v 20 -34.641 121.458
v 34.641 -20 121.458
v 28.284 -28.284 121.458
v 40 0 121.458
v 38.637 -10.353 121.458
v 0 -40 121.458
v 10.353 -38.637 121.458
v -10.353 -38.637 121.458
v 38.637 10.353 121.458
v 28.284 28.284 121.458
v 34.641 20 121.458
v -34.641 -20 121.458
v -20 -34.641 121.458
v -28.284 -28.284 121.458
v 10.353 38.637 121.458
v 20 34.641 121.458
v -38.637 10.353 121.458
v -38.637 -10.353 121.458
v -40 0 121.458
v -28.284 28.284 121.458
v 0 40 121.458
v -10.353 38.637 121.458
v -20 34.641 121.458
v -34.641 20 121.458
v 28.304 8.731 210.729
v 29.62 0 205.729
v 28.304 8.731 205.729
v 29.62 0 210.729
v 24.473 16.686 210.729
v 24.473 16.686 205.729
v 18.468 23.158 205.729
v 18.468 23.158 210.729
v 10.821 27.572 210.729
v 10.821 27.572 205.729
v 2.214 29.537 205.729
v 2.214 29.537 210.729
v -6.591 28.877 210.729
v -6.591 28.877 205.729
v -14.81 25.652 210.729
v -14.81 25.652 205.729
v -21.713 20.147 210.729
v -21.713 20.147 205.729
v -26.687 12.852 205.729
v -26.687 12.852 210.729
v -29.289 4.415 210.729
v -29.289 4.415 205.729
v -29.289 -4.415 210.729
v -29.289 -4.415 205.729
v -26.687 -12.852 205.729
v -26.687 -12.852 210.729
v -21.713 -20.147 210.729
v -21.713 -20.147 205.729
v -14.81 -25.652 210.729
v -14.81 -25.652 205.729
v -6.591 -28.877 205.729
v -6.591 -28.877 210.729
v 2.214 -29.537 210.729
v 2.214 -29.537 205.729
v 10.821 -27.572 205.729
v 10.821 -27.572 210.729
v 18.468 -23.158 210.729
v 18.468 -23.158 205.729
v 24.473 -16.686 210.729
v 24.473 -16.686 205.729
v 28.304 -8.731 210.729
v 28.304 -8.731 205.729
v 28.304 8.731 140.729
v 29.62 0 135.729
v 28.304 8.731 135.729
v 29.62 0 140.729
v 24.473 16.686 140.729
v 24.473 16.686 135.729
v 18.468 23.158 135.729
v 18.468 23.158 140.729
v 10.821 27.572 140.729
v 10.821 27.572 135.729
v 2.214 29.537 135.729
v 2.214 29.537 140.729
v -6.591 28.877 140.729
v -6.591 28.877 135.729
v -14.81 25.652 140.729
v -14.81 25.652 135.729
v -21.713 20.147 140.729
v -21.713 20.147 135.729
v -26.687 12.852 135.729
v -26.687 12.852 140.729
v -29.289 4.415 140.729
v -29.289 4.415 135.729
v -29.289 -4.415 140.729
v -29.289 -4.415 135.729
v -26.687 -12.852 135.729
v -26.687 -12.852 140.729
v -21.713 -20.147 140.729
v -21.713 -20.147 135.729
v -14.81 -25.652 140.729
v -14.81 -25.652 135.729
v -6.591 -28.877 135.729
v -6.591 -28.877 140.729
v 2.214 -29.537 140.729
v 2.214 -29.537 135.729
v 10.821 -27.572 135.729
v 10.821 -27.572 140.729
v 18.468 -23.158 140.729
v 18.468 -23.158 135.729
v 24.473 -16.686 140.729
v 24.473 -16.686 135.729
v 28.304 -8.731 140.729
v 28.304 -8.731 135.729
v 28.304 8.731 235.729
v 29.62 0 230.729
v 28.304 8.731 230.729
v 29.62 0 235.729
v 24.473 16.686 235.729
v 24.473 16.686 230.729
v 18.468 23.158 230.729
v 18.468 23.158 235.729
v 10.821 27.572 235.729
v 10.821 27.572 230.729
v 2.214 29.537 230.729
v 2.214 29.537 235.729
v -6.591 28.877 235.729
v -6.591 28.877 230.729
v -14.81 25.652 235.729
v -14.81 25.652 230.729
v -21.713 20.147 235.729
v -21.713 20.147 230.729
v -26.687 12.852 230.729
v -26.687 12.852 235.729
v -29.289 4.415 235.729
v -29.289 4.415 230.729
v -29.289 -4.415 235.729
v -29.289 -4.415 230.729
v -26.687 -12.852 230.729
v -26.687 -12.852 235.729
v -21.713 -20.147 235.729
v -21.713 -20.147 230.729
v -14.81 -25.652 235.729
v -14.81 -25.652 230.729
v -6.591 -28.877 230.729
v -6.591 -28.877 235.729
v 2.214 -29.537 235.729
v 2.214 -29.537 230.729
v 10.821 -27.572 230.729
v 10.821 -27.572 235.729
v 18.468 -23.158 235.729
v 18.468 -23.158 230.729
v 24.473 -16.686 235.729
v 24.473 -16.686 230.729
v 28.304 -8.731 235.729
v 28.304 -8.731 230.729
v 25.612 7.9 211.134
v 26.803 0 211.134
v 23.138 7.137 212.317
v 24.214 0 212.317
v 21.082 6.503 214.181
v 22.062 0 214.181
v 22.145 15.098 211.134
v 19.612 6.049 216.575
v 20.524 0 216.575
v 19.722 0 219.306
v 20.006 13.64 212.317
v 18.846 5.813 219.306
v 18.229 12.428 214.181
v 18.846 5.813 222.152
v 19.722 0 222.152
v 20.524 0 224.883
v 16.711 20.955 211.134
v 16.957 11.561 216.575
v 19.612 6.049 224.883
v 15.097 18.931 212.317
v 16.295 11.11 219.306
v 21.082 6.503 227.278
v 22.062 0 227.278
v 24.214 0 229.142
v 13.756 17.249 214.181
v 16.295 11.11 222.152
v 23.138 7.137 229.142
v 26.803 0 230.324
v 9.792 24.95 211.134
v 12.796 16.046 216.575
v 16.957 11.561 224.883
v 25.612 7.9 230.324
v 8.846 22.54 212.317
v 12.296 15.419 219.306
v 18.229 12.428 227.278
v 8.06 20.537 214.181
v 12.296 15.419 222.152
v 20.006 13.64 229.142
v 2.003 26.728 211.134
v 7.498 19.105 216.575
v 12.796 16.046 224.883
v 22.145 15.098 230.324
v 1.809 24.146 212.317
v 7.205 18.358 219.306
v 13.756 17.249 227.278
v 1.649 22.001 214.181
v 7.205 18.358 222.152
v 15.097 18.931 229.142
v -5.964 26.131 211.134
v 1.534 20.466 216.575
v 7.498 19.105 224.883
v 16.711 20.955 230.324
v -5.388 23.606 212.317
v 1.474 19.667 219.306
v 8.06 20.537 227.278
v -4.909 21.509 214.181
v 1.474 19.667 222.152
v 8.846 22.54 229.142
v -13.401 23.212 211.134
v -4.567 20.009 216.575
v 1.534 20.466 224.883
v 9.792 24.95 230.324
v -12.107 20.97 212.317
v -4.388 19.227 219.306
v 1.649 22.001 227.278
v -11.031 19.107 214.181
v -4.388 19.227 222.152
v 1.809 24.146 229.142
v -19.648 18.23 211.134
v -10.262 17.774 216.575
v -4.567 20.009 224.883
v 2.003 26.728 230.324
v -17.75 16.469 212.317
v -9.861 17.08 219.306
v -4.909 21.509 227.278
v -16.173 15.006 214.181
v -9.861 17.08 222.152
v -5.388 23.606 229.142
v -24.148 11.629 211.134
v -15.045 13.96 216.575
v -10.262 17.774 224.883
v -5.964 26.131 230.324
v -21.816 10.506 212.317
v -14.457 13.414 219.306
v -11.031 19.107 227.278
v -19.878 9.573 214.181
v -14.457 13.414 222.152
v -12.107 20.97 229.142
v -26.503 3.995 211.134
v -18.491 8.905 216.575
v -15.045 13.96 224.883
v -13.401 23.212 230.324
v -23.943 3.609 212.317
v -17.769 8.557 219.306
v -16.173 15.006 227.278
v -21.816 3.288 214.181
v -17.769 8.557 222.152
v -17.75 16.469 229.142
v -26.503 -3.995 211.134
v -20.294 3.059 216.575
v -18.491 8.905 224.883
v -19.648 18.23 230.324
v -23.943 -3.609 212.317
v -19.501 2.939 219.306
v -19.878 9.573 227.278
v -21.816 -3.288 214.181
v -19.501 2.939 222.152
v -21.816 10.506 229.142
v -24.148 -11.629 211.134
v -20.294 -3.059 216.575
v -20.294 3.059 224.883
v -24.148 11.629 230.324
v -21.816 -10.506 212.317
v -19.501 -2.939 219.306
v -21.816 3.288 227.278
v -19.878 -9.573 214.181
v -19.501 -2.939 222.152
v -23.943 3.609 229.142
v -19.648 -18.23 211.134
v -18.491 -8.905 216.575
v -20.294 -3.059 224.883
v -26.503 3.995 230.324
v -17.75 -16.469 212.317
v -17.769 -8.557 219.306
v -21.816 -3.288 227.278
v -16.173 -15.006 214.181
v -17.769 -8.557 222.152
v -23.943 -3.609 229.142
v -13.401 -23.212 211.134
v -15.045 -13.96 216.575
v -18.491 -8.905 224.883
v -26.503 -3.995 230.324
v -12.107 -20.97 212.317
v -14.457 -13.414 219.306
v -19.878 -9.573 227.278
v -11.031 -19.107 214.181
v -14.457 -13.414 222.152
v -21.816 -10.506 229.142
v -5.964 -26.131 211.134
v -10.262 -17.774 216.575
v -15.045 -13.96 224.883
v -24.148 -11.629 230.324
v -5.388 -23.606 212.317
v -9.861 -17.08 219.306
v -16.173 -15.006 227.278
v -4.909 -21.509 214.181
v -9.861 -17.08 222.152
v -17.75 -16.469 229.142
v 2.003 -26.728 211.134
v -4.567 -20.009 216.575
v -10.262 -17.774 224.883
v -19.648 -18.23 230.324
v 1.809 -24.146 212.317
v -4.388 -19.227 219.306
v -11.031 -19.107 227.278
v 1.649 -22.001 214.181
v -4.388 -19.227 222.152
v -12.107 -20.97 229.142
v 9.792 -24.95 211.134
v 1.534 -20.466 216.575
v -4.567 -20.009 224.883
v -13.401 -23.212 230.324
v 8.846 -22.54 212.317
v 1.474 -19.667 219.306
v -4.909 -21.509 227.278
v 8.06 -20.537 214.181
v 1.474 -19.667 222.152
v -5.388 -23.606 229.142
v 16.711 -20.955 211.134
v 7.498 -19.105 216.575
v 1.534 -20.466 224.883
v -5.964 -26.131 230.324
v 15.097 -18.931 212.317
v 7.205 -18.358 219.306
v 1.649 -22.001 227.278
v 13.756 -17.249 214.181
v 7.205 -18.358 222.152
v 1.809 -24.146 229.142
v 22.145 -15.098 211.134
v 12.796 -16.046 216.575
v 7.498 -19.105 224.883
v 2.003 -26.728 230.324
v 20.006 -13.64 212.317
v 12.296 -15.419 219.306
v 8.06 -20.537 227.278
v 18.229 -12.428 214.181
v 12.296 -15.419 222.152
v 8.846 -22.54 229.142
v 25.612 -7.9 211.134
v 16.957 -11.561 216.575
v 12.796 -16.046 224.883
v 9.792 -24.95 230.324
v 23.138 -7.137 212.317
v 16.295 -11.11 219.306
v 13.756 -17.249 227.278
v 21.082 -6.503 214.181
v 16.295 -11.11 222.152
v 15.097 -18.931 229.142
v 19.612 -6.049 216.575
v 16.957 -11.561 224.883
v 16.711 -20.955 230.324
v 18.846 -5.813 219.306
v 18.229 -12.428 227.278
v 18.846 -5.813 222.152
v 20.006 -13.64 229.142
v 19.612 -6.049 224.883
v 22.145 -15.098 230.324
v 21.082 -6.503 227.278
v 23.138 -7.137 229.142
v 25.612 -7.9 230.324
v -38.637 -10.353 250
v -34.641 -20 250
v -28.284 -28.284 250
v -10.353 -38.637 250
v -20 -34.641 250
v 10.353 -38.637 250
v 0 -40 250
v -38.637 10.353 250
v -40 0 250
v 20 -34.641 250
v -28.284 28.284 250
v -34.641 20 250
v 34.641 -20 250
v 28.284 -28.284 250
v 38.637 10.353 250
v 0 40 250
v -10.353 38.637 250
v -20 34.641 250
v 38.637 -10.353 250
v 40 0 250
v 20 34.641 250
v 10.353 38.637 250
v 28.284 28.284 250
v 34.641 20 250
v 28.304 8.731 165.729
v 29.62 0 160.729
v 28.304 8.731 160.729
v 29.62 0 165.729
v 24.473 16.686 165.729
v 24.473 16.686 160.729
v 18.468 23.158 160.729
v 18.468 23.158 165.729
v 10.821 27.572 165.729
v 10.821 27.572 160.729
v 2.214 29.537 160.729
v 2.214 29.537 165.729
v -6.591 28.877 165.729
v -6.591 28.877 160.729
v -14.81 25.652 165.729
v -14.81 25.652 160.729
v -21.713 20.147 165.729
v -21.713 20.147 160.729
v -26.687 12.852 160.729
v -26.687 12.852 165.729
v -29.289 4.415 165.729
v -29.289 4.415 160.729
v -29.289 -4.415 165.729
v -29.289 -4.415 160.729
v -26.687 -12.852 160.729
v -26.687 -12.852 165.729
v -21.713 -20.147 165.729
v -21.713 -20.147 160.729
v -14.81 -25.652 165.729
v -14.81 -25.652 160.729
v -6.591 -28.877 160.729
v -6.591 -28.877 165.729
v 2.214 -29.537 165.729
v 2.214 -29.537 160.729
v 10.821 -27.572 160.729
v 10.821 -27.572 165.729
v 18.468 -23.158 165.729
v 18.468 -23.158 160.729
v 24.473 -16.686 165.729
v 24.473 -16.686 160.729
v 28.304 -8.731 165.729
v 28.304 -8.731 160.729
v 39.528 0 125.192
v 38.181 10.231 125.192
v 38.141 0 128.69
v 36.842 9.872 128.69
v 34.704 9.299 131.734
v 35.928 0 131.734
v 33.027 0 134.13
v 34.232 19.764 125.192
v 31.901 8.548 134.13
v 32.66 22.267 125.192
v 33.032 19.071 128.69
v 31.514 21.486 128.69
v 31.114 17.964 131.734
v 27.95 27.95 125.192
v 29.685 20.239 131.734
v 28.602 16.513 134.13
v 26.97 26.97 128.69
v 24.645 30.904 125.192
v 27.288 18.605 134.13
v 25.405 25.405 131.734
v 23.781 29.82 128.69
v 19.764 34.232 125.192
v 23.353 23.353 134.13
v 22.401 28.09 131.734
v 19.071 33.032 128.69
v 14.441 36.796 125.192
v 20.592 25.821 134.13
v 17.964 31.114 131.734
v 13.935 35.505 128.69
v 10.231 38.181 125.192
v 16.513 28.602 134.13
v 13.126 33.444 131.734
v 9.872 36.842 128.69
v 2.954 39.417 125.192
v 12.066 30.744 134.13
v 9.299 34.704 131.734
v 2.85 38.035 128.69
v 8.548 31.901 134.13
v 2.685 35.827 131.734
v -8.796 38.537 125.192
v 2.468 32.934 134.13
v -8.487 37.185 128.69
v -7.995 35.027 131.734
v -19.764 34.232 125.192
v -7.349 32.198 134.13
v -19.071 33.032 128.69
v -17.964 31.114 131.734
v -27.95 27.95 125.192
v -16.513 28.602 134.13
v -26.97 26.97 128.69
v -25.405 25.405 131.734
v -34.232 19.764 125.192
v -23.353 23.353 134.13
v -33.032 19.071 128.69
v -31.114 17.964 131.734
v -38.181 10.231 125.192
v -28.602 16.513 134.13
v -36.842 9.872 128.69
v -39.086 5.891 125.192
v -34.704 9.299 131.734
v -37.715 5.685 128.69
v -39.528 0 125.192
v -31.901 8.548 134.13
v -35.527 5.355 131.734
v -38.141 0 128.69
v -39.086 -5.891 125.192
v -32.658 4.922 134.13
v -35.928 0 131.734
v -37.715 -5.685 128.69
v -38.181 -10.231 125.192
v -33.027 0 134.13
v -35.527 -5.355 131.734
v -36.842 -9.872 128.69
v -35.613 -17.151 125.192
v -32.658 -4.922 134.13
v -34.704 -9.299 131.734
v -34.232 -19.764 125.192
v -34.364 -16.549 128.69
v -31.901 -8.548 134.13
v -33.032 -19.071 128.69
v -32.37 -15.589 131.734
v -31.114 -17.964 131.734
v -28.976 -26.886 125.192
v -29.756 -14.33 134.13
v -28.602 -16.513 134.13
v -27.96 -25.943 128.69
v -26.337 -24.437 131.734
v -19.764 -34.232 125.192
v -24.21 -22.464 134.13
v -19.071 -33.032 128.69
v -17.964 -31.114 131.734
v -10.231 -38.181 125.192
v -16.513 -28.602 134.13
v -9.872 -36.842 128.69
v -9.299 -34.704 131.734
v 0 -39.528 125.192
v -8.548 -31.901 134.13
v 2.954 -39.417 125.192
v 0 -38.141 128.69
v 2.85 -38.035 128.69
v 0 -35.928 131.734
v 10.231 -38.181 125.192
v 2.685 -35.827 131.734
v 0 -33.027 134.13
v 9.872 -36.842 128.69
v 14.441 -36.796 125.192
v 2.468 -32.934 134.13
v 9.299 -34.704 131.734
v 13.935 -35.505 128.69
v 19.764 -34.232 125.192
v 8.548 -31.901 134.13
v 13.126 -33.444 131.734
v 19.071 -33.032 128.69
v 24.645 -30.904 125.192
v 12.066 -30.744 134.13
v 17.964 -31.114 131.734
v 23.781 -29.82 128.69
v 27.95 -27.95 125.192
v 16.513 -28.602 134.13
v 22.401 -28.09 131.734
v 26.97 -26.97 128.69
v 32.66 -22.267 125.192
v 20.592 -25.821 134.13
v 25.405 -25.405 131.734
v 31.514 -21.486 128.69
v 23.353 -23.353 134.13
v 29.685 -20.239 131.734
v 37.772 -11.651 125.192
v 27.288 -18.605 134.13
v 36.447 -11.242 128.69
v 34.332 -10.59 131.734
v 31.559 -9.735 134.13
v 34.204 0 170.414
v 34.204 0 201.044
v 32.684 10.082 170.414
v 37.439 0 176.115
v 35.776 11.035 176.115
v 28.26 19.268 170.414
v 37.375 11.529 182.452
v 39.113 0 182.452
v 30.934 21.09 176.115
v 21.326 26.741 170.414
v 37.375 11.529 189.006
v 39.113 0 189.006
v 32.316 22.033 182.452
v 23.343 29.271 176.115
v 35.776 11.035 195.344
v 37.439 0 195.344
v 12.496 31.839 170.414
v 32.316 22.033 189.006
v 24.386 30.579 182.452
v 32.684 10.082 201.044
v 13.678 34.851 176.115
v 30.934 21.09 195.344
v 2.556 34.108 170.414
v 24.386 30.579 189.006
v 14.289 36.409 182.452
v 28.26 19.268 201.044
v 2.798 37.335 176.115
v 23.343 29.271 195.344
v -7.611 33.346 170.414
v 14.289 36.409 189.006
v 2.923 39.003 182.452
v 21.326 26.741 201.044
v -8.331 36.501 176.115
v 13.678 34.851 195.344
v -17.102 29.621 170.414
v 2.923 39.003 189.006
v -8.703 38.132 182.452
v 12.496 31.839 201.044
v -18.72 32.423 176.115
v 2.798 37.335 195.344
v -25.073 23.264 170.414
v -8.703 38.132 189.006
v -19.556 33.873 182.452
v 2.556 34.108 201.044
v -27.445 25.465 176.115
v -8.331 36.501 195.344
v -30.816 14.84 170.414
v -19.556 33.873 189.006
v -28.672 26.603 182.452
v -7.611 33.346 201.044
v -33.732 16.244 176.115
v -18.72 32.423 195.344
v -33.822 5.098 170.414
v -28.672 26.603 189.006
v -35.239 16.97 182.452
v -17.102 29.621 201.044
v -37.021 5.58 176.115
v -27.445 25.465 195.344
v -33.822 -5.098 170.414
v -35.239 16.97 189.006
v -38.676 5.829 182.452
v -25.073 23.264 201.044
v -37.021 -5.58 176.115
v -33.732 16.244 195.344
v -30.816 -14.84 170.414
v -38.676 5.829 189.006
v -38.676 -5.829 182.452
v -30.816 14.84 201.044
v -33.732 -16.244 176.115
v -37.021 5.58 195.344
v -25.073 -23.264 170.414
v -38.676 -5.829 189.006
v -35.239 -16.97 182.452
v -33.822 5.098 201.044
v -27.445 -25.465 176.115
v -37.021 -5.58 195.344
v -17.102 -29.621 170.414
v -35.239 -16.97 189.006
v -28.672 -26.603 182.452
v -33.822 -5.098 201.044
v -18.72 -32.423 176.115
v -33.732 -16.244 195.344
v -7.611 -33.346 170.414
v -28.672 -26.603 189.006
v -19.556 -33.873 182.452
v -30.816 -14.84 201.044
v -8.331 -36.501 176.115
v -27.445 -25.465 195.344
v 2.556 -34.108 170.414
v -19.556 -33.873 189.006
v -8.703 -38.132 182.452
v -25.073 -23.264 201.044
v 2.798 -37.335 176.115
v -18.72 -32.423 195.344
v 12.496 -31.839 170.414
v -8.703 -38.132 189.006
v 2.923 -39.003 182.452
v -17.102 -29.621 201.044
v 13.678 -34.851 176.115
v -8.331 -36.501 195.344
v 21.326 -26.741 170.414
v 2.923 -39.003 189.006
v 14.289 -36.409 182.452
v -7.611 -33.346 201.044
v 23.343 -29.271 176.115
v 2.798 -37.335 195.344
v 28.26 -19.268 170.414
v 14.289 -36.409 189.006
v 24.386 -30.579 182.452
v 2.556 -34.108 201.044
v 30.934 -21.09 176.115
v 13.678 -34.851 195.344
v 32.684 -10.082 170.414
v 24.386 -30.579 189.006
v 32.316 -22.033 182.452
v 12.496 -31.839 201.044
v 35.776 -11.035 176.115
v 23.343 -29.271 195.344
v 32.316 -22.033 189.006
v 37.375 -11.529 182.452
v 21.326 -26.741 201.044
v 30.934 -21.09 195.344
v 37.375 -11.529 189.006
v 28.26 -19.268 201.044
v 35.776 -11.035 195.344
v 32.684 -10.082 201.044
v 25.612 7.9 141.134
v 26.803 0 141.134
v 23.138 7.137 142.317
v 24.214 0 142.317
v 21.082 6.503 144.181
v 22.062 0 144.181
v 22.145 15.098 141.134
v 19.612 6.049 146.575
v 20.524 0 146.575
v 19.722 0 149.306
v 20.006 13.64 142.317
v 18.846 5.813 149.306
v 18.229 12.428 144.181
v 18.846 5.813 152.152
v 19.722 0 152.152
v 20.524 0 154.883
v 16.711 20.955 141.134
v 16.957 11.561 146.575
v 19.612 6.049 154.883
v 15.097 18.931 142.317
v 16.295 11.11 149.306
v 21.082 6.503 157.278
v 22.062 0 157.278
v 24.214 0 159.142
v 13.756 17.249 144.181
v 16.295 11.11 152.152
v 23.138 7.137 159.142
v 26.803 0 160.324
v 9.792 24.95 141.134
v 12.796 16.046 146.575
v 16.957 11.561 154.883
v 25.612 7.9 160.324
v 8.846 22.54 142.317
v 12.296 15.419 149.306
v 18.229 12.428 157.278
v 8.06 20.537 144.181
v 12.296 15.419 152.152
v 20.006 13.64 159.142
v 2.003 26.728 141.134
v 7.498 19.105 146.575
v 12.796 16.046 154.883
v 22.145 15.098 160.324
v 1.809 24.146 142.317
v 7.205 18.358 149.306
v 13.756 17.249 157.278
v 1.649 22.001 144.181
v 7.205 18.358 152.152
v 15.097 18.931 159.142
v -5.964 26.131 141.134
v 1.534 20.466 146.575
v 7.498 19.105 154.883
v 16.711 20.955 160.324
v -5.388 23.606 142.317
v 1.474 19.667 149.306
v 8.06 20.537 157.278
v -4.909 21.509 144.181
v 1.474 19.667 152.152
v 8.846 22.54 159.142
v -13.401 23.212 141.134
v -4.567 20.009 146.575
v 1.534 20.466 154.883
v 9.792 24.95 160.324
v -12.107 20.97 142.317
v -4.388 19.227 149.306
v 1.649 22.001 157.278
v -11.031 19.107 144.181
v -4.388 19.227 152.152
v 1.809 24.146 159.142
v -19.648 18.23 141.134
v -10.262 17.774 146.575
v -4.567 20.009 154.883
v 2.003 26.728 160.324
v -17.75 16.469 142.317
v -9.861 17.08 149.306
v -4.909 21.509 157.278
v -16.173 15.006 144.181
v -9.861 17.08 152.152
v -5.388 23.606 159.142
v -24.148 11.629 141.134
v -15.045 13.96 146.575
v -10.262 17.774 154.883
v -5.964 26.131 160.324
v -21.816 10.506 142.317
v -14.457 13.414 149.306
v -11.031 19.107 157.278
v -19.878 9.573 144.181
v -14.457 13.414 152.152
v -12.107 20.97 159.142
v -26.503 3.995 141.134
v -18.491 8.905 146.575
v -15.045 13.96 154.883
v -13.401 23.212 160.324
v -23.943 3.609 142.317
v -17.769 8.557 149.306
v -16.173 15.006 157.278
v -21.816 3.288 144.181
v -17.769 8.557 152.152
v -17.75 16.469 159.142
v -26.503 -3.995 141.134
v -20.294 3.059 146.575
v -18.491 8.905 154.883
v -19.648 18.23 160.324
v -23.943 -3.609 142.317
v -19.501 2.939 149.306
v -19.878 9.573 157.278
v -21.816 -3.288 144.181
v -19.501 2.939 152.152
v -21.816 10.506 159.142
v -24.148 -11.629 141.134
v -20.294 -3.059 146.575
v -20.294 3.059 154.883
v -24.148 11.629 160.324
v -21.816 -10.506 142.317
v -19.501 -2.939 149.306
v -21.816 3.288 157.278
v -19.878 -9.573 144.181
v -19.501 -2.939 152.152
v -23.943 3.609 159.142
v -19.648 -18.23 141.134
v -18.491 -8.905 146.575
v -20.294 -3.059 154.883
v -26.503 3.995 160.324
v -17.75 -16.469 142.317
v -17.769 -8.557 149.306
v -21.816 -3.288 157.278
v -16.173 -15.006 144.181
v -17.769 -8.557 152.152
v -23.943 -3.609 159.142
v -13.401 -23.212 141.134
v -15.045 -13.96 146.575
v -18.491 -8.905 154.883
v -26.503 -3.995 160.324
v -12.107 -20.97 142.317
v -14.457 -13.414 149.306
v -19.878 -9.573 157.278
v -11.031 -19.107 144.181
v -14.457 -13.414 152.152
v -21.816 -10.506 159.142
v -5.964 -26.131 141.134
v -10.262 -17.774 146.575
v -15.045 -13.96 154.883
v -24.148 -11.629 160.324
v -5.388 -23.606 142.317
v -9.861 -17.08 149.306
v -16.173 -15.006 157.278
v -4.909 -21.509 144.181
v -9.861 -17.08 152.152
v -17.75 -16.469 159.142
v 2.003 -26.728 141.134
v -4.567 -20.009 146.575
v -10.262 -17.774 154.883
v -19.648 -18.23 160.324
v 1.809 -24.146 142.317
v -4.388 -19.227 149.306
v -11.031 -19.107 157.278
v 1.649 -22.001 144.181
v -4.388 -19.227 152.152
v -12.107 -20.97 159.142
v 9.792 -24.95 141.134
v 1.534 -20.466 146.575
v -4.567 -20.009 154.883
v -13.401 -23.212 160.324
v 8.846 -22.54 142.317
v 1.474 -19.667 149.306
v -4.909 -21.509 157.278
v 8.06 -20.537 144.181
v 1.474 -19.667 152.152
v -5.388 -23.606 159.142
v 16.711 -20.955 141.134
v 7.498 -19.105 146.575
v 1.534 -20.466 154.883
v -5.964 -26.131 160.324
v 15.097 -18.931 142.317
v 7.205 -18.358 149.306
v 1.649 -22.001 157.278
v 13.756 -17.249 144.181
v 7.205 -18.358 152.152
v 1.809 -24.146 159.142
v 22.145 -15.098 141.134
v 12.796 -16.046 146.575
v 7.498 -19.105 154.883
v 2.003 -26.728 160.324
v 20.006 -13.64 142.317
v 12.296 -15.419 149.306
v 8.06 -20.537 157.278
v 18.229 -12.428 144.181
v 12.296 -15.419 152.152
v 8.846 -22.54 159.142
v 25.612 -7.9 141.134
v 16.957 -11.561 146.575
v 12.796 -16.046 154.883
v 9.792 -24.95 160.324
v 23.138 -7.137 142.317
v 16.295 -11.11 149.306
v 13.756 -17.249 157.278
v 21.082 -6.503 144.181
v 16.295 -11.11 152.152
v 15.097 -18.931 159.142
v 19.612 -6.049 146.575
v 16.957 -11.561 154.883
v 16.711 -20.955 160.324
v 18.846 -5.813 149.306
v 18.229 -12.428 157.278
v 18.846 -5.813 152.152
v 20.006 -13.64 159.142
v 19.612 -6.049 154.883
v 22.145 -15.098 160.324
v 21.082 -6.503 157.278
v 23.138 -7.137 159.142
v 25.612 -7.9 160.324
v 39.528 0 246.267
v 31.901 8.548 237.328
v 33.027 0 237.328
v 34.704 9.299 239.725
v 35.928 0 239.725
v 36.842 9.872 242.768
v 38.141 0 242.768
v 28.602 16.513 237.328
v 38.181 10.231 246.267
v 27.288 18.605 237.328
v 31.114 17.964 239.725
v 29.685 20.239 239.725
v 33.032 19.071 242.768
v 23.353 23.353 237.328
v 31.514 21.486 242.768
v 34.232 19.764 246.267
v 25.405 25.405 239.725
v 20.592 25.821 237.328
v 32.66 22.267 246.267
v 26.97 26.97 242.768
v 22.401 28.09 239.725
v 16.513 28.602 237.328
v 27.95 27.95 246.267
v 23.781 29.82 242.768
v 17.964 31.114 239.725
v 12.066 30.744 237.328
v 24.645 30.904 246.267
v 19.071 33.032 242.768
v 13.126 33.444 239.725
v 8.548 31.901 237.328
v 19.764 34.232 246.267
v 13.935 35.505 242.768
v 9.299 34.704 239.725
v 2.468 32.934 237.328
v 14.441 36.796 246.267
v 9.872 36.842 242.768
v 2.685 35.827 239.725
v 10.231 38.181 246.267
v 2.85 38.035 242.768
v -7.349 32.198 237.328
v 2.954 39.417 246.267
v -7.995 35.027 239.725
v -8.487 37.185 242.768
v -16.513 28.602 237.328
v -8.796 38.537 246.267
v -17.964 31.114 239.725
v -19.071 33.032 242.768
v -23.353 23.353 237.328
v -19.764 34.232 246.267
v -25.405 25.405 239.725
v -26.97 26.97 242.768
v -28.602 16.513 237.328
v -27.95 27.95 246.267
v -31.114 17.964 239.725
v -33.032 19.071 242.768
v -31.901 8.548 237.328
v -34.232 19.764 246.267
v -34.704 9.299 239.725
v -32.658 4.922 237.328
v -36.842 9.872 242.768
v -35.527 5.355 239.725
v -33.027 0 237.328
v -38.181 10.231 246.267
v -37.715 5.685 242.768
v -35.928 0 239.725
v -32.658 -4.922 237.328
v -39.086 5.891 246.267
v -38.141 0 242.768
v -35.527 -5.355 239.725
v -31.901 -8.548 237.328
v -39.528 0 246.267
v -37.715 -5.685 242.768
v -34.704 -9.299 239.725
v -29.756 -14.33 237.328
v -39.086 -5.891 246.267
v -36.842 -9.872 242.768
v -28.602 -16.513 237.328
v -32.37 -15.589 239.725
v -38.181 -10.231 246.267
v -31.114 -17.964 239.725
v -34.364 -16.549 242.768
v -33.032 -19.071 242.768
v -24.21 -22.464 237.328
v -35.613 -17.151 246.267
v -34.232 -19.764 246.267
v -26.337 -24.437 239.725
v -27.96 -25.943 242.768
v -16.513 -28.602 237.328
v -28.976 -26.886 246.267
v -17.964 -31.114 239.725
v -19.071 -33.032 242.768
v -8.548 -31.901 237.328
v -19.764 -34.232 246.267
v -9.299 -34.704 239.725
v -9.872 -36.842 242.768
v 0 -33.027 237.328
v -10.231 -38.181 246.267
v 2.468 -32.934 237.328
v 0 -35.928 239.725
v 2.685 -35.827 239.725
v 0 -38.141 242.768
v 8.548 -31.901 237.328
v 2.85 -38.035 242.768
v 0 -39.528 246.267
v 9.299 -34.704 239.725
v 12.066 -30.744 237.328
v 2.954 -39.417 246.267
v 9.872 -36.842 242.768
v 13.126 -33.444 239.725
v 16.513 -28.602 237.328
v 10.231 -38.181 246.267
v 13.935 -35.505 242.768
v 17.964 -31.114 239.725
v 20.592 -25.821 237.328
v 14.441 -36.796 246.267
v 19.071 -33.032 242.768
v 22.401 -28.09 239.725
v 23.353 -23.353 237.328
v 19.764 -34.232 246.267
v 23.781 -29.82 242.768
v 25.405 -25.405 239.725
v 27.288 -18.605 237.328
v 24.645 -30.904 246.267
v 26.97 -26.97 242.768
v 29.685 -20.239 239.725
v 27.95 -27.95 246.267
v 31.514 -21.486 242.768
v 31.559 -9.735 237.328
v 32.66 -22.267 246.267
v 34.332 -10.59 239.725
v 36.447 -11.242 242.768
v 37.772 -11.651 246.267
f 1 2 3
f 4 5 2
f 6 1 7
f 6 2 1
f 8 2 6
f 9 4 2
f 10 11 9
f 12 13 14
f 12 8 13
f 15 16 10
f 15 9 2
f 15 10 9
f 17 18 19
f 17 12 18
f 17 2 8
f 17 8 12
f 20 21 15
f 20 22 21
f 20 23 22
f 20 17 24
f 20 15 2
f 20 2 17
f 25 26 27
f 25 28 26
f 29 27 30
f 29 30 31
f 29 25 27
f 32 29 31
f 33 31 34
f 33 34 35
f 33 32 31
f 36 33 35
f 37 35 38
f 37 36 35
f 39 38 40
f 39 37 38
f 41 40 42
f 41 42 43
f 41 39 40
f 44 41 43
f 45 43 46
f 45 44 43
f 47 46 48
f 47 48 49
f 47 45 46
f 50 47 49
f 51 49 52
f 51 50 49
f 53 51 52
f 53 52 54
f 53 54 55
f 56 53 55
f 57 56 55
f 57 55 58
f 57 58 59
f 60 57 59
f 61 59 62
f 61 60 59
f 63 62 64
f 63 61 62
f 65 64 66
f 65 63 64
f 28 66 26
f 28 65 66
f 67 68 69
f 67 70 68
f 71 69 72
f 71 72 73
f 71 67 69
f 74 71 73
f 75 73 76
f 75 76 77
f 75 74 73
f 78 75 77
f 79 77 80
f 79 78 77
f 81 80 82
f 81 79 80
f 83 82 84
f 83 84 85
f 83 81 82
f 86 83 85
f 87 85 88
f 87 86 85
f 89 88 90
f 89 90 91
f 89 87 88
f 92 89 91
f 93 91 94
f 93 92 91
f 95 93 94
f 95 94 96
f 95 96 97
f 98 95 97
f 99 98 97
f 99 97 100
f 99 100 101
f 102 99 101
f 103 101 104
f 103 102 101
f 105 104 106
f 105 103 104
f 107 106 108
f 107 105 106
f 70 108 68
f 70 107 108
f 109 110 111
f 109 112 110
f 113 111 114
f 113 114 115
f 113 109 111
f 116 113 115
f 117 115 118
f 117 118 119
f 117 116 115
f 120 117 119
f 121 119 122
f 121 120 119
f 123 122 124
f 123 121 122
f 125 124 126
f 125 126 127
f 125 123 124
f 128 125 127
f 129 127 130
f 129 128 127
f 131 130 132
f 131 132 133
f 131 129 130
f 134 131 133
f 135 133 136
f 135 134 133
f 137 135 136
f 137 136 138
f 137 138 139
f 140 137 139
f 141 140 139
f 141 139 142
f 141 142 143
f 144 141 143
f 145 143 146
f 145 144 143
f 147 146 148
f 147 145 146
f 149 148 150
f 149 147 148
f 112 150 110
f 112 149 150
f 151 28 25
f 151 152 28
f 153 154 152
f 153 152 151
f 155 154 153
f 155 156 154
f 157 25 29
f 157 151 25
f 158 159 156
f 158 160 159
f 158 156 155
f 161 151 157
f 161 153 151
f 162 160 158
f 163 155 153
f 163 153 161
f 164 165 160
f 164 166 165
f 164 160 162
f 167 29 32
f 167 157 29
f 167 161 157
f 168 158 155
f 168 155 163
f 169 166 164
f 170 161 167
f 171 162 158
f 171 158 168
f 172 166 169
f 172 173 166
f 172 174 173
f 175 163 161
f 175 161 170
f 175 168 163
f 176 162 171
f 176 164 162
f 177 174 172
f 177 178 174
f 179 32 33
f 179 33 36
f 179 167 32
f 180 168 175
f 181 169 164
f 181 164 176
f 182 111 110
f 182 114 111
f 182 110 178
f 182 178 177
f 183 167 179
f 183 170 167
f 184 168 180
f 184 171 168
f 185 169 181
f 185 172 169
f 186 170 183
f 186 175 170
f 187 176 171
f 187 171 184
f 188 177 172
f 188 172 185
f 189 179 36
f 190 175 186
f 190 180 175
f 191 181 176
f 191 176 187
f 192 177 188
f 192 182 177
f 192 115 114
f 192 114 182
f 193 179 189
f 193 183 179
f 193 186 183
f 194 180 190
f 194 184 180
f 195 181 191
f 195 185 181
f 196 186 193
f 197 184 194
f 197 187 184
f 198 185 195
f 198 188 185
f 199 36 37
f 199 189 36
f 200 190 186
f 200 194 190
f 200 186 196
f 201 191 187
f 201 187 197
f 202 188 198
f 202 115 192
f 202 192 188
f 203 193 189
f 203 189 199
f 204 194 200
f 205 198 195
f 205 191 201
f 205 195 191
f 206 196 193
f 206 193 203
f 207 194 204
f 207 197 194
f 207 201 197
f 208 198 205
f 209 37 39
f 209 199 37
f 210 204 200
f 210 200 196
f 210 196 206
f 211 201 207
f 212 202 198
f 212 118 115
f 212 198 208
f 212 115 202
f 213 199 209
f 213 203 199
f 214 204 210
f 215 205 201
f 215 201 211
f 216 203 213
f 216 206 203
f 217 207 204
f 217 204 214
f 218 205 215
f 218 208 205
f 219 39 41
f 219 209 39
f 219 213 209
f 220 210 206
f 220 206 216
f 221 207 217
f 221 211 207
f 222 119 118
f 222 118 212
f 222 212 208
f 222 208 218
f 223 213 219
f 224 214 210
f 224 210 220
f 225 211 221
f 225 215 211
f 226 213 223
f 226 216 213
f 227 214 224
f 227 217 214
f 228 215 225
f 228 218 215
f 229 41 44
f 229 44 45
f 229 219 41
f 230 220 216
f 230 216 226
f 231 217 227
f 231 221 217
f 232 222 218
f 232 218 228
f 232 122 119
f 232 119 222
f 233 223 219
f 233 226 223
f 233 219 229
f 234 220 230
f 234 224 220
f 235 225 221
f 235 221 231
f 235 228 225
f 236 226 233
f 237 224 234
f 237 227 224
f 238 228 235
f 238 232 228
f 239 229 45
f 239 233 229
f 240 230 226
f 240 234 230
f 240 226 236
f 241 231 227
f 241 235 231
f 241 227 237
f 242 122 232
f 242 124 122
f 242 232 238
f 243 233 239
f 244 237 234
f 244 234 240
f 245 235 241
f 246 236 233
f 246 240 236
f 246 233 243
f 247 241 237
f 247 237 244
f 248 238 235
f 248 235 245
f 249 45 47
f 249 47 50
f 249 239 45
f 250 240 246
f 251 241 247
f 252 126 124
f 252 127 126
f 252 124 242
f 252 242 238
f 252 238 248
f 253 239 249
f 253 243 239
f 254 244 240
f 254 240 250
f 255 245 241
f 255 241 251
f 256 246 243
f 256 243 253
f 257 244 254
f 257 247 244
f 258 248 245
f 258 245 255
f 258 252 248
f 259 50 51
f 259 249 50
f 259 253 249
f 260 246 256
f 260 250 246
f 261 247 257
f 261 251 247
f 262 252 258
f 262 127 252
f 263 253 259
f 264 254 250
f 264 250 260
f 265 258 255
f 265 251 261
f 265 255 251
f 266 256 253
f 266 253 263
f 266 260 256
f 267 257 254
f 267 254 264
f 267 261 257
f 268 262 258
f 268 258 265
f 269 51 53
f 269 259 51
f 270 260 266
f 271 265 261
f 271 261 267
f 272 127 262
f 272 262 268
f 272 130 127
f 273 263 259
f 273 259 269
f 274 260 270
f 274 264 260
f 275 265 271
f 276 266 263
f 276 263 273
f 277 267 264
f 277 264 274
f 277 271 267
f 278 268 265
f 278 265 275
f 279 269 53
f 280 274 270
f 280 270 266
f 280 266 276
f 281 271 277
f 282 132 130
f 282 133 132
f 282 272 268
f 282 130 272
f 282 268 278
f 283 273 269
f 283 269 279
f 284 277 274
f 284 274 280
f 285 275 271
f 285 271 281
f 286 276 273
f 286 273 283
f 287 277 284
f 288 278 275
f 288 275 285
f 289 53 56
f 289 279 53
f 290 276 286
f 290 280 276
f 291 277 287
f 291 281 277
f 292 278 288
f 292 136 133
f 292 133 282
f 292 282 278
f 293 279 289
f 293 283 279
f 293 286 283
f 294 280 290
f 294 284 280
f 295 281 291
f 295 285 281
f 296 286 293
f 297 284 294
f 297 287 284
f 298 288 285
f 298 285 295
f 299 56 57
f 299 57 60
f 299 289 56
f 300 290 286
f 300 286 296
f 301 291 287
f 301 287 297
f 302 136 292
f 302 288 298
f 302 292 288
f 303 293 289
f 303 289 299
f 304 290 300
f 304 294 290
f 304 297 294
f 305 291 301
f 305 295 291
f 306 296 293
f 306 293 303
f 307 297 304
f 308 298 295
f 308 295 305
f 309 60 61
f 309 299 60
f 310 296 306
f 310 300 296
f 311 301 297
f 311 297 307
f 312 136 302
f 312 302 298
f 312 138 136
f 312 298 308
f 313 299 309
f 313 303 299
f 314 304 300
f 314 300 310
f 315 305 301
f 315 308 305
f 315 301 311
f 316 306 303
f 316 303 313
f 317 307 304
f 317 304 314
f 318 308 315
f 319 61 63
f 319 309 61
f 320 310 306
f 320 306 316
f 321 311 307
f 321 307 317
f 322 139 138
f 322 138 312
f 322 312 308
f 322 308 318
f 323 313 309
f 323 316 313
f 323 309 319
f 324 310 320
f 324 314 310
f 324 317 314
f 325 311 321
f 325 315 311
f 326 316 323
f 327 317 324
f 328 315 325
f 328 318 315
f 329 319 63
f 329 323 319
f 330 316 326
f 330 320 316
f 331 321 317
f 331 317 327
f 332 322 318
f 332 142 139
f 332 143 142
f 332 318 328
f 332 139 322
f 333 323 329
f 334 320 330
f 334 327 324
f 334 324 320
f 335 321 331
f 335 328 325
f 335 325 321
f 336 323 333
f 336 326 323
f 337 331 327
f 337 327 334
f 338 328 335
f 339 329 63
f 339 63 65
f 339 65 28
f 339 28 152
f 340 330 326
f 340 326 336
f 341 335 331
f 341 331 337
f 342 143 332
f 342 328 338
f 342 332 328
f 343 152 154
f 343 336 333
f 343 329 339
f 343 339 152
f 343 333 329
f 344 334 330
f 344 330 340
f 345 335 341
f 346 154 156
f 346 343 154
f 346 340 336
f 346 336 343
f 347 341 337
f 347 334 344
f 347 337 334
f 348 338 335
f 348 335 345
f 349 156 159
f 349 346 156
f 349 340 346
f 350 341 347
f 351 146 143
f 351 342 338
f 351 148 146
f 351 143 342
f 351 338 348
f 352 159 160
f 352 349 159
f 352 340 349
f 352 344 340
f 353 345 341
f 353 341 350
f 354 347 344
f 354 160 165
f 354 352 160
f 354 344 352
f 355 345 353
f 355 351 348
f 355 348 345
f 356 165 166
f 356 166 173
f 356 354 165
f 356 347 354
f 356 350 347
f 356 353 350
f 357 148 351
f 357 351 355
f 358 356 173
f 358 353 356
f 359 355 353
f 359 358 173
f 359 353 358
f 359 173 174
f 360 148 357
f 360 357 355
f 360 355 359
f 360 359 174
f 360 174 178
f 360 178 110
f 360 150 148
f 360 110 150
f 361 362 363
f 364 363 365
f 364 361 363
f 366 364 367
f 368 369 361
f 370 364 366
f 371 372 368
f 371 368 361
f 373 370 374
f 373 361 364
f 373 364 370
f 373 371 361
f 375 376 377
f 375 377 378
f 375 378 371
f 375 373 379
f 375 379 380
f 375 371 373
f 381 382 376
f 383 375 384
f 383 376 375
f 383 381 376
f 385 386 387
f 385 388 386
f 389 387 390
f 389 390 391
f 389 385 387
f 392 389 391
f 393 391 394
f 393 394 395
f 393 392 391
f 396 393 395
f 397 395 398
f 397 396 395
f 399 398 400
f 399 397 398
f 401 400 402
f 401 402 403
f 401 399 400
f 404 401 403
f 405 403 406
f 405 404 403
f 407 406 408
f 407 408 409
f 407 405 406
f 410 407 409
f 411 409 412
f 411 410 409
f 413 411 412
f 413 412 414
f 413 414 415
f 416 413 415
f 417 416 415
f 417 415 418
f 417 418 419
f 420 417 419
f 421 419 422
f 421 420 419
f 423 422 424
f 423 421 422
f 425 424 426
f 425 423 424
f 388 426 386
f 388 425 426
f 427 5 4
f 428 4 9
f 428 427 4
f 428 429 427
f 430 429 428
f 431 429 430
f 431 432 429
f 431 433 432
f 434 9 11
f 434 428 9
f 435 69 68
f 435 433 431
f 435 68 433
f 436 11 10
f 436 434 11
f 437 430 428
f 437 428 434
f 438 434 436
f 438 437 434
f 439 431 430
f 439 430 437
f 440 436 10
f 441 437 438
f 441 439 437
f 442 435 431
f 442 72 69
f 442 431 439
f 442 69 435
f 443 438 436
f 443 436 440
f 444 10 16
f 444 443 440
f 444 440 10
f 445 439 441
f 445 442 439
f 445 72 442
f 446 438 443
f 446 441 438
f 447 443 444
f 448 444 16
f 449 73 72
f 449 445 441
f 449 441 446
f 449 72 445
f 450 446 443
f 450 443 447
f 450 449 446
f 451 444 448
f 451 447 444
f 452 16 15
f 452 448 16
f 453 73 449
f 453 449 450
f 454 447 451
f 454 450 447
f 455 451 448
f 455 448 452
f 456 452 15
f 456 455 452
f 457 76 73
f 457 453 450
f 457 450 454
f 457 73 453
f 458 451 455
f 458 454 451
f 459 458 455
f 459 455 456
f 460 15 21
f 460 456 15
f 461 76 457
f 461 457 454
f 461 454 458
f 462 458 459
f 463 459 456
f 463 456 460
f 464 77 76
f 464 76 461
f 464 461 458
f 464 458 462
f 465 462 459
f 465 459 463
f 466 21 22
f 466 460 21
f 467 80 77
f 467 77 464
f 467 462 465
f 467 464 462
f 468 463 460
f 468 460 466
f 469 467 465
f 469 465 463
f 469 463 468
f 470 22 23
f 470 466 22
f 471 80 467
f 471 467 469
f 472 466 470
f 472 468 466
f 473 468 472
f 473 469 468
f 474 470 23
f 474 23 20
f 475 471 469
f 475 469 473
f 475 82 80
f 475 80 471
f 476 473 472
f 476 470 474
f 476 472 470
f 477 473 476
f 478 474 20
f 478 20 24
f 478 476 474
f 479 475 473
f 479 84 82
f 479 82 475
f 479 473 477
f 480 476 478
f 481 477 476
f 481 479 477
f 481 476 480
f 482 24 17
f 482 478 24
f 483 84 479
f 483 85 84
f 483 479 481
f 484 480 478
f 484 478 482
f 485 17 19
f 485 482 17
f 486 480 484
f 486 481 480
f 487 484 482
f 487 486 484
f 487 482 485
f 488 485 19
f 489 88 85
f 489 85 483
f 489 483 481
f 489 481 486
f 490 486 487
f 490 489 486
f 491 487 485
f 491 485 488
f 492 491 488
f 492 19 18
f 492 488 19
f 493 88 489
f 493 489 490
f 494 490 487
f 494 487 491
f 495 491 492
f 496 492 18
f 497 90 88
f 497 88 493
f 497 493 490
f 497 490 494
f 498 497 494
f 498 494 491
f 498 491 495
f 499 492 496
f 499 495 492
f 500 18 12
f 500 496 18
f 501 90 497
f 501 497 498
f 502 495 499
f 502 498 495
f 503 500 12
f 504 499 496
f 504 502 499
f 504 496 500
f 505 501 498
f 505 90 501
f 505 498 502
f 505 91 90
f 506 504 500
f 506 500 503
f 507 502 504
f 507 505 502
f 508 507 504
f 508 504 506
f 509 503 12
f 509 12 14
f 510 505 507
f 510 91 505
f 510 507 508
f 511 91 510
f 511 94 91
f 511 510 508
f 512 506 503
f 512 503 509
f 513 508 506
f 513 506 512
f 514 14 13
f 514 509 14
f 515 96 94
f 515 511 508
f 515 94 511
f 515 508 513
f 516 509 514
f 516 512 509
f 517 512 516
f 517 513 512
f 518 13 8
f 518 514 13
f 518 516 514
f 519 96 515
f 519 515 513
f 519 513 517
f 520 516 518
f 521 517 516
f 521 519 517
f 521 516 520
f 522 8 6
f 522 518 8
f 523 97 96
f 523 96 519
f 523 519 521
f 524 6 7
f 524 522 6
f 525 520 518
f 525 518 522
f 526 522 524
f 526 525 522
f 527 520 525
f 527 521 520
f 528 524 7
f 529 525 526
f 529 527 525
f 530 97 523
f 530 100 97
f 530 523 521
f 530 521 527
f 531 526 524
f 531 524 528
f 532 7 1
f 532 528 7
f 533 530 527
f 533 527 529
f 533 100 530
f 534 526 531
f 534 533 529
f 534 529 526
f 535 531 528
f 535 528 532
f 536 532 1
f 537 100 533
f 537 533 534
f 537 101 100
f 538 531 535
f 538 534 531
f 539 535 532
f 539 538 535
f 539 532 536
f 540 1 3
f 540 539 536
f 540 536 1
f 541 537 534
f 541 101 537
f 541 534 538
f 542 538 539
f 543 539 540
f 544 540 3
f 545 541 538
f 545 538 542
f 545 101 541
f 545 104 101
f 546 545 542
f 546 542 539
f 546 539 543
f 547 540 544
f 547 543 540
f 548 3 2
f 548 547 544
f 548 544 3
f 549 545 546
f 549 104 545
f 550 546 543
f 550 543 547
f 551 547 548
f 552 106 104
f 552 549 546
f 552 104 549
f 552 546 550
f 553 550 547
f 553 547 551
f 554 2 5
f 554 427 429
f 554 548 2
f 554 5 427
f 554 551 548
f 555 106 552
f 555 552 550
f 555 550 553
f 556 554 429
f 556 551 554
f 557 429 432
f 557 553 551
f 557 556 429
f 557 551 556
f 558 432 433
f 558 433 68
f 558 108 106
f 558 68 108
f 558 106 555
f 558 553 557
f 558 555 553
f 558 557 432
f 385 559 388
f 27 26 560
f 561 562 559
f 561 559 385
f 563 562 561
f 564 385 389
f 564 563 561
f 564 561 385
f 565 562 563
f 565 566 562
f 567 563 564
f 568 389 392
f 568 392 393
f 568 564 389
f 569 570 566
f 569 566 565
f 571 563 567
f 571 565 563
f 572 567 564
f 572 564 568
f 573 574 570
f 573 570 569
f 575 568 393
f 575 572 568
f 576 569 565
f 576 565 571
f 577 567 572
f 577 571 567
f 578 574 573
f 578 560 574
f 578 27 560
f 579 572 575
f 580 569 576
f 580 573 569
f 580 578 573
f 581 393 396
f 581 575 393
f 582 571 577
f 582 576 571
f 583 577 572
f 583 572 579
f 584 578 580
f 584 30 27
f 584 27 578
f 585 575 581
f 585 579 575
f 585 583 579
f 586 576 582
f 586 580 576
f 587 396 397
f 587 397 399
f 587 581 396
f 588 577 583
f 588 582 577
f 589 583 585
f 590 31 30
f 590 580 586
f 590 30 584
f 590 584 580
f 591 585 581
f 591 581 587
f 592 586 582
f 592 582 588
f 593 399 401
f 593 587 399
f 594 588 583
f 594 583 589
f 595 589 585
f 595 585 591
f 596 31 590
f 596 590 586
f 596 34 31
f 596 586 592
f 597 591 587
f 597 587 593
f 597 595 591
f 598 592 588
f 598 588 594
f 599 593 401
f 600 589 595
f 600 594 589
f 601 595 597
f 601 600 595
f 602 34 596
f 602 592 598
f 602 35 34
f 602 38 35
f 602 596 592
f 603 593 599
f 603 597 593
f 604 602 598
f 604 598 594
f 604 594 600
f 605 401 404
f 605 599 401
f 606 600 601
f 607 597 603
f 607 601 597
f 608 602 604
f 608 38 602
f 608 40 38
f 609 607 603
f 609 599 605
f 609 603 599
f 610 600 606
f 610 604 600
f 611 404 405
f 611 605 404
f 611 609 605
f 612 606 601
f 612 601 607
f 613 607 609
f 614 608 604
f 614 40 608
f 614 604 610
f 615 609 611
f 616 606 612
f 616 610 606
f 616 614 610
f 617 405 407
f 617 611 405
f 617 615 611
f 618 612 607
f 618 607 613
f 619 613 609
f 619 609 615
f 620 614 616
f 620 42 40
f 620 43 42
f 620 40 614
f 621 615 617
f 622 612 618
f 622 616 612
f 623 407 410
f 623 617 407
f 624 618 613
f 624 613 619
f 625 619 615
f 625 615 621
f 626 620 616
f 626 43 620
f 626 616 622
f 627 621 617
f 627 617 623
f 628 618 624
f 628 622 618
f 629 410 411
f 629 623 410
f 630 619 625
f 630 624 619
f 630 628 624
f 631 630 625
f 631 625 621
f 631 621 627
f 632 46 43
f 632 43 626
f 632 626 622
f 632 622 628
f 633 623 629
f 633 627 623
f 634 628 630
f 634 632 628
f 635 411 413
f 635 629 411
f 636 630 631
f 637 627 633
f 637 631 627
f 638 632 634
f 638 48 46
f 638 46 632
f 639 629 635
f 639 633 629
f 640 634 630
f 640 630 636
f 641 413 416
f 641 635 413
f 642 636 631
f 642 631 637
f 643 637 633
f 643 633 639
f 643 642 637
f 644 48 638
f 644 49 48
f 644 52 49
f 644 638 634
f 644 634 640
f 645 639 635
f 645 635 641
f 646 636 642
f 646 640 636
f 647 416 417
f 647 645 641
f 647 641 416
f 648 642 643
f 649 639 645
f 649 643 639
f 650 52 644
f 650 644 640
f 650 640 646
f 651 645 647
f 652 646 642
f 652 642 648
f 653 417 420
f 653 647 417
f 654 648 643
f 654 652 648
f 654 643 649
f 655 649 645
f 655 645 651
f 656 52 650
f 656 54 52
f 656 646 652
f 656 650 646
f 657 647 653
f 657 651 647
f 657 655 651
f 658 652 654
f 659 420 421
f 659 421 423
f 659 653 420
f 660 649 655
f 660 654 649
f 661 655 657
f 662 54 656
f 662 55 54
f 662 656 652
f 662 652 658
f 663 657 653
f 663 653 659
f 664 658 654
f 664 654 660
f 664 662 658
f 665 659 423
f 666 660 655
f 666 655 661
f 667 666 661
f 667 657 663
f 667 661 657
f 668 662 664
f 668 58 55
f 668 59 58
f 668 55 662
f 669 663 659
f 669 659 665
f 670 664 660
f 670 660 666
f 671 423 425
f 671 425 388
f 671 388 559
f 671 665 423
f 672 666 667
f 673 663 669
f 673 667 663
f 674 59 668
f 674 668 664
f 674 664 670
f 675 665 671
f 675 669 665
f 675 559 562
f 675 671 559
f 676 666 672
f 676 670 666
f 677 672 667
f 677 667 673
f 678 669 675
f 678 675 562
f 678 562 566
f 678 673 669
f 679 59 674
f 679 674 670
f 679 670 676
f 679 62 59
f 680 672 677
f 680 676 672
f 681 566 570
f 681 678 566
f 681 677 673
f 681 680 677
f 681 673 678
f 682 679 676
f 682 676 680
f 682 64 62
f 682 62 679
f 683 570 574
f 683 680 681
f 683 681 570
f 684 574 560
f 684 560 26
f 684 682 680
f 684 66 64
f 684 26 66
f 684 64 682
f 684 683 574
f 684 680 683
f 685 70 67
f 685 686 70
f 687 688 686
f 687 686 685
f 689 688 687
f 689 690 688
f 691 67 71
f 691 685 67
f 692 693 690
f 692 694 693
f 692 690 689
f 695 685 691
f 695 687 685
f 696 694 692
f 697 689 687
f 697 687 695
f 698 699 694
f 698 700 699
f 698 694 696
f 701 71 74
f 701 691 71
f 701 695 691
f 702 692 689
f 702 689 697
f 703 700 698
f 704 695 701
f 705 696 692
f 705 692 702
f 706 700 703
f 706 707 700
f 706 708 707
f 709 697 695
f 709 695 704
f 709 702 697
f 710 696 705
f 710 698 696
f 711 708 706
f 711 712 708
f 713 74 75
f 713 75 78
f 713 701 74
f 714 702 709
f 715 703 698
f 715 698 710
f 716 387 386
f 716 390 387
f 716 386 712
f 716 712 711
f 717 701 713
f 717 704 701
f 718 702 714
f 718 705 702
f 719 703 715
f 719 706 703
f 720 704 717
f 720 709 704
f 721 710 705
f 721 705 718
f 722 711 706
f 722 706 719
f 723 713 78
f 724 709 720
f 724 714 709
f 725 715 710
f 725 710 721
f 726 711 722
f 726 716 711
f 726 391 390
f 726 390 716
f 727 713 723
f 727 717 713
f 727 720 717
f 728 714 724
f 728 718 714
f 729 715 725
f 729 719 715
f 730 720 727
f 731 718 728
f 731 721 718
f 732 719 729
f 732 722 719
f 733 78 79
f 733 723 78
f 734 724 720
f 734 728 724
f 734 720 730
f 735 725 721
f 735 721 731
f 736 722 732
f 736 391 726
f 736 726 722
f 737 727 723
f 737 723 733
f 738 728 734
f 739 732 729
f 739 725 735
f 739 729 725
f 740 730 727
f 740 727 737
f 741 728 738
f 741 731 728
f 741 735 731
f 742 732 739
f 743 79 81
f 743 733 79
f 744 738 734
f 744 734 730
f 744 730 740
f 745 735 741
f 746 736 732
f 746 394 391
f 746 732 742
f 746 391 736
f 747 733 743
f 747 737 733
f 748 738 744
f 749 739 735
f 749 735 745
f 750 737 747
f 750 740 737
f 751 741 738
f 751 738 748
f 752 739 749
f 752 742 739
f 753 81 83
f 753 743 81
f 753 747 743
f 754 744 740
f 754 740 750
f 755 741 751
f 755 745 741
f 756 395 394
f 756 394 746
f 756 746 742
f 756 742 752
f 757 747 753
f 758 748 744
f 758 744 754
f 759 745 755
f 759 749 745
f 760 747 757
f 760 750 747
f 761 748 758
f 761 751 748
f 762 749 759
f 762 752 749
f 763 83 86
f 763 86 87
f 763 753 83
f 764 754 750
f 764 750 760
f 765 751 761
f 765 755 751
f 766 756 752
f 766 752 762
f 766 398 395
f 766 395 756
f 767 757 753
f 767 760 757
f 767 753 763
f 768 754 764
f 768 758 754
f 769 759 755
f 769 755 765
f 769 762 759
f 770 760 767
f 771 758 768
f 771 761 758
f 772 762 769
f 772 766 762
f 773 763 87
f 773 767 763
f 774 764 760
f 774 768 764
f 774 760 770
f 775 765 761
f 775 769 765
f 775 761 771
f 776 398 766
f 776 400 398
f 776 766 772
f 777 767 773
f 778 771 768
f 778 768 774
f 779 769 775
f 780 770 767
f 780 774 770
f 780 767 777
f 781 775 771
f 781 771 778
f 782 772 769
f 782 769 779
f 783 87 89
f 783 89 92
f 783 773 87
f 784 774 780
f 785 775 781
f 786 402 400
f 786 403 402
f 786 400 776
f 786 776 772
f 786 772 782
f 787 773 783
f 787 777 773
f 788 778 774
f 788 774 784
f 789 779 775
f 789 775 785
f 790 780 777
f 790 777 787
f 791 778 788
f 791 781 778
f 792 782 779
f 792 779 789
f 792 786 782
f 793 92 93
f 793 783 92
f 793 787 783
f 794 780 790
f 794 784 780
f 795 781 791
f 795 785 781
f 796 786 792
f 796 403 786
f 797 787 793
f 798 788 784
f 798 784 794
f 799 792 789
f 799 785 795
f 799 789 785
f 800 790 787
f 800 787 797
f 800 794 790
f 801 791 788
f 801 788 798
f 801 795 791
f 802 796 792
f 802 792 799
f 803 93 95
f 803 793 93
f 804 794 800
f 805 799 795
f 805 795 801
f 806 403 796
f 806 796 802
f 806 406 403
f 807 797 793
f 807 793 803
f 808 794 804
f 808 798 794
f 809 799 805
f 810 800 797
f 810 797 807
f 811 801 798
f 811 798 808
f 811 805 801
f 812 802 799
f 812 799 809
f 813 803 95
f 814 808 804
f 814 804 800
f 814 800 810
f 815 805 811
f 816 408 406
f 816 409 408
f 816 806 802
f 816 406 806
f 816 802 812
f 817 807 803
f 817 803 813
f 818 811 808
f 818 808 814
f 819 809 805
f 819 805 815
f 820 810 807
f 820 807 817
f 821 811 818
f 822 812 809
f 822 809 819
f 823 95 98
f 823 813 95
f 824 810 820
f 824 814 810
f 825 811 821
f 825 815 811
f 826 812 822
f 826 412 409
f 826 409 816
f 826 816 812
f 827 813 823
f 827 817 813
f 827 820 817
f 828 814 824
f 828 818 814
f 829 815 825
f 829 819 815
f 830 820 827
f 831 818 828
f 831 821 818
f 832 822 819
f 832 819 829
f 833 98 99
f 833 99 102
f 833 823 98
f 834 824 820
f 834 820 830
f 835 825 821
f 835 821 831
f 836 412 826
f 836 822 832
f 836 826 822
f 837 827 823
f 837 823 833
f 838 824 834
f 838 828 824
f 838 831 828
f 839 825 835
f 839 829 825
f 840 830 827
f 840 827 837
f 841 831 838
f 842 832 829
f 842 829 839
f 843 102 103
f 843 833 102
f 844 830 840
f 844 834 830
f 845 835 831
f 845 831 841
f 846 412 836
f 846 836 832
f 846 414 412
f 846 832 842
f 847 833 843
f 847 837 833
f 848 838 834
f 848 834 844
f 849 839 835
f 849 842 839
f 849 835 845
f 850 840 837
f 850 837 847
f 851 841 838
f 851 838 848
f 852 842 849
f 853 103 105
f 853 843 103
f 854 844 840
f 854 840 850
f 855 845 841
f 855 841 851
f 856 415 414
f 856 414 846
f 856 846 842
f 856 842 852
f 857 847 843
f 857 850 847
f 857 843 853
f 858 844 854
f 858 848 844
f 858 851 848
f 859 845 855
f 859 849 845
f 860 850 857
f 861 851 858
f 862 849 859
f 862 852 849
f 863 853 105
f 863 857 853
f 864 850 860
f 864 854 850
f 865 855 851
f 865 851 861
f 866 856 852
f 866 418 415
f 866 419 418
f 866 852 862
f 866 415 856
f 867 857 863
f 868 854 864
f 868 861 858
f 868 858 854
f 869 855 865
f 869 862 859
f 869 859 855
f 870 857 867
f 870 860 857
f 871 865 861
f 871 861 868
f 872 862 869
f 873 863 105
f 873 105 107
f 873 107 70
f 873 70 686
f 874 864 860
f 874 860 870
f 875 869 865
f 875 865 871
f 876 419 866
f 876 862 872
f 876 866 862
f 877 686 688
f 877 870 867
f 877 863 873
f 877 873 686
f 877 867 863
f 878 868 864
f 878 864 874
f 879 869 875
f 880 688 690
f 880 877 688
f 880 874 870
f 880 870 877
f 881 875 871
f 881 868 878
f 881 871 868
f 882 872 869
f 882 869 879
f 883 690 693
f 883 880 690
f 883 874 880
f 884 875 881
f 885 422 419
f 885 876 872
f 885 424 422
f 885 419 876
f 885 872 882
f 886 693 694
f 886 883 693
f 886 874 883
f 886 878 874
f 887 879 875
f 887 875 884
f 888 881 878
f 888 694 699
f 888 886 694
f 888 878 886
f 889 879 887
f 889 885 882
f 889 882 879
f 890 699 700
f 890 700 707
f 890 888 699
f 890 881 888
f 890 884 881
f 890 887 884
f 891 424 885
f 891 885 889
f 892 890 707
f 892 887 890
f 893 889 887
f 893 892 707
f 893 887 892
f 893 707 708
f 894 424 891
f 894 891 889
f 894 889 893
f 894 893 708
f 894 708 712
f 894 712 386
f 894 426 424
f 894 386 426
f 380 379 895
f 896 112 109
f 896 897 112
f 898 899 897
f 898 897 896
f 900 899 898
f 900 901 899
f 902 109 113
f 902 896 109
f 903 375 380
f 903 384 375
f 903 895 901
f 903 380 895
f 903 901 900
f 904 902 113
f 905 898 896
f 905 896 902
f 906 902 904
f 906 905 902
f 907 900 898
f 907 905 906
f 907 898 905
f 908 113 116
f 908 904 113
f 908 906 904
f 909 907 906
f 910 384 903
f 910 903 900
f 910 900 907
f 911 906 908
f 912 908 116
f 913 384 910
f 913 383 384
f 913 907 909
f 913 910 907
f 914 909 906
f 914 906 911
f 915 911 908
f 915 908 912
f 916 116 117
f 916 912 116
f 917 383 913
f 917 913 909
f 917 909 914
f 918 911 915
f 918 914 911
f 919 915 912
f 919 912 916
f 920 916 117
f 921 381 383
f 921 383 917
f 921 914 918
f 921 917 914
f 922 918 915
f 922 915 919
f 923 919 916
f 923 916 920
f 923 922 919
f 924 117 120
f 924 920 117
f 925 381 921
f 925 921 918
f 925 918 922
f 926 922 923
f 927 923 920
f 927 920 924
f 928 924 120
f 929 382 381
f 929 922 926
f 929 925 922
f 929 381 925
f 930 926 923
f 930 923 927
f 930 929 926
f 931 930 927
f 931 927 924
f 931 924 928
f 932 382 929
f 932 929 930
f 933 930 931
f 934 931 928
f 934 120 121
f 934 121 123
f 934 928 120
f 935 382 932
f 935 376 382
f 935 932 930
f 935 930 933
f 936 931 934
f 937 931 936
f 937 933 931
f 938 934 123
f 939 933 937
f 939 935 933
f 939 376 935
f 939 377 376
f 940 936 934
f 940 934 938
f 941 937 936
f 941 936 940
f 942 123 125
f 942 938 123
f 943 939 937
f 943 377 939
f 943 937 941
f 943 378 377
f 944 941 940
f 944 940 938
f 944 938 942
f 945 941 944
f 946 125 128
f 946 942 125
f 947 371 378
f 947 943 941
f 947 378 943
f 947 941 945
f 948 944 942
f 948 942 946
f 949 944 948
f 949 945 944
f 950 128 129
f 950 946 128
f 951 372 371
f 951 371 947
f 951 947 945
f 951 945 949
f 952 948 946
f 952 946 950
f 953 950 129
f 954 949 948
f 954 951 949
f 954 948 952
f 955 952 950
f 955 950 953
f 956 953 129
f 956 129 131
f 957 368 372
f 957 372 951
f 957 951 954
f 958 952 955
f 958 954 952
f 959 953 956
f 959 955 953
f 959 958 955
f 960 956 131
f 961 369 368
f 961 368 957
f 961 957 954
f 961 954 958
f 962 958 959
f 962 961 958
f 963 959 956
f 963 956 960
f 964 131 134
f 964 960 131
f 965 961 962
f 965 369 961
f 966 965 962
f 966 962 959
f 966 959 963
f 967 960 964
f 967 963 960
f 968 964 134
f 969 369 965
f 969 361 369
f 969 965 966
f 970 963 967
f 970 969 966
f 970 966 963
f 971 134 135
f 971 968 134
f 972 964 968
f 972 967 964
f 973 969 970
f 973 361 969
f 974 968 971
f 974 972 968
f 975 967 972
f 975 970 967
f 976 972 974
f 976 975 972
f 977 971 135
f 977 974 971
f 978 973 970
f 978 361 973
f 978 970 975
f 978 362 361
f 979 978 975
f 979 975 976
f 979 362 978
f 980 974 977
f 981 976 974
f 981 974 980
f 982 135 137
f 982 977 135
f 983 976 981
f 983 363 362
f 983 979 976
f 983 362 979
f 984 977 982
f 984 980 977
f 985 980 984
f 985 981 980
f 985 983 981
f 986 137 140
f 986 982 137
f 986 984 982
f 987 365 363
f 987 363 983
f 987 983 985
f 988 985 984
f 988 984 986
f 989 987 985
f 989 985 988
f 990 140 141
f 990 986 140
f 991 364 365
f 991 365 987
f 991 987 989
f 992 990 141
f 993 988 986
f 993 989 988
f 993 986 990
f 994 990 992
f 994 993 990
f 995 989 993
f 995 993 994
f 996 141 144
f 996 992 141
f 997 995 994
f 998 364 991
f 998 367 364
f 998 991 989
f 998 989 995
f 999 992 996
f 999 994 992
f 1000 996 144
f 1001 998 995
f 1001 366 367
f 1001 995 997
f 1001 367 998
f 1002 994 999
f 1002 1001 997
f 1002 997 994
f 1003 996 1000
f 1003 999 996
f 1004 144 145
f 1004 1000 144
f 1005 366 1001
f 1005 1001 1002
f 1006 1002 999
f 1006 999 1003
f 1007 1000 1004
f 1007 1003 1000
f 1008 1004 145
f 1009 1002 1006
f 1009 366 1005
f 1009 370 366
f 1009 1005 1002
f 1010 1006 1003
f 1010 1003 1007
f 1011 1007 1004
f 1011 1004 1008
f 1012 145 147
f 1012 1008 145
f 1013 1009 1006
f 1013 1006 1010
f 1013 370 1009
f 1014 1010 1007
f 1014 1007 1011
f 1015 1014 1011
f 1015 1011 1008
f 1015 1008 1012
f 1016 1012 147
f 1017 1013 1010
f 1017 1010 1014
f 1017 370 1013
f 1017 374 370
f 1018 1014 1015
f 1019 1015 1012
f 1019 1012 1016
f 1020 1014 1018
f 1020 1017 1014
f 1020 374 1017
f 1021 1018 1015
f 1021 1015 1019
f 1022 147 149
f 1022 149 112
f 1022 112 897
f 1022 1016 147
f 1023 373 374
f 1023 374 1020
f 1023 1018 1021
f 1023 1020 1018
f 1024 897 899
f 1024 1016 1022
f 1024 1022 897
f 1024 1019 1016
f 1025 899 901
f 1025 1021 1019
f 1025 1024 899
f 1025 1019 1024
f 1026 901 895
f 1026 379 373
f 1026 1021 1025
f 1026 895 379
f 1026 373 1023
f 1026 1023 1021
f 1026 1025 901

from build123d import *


with BuildPart() as f1:
    # F0 (on Front) → F1 (revolve)
    with BuildSketch(Plane.XZ):
        with BuildLine():
            Line((40, 250), (0, 250))
            Line((0, 250), (0, 121.458379))
            Line((0, 121.458379), (40, 121.458379))
            ThreePointArc((40, 121.458379), (37.130525, 130.281663), (29.619953, 135.729189))
            Line((29.619953, 135.729189), (29.619953, 140.729189))
            ThreePointArc((29.619953, 140.729189), (19.619953, 150.729189), (29.619953, 160.729189))
            Line((29.619953, 160.729189), (29.619953, 165.729189))
            ThreePointArc((29.619953, 165.729189), (39.324421, 185.729189), (29.619953, 205.729189))
            Line((29.619953, 205.729189), (29.619953, 210.729189))
            ThreePointArc((29.619953, 210.729189), (19.619953, 220.729189), (29.619953, 230.729189))
            Line((29.619953, 230.729189), (29.619953, 235.729189))
            ThreePointArc((29.619953, 235.729189), (37.130525, 241.176715), (40, 250))
        make_face()
    revolve(axis=Axis((0, 0, 125), (0, 0, 1)))


solid = f1.part
